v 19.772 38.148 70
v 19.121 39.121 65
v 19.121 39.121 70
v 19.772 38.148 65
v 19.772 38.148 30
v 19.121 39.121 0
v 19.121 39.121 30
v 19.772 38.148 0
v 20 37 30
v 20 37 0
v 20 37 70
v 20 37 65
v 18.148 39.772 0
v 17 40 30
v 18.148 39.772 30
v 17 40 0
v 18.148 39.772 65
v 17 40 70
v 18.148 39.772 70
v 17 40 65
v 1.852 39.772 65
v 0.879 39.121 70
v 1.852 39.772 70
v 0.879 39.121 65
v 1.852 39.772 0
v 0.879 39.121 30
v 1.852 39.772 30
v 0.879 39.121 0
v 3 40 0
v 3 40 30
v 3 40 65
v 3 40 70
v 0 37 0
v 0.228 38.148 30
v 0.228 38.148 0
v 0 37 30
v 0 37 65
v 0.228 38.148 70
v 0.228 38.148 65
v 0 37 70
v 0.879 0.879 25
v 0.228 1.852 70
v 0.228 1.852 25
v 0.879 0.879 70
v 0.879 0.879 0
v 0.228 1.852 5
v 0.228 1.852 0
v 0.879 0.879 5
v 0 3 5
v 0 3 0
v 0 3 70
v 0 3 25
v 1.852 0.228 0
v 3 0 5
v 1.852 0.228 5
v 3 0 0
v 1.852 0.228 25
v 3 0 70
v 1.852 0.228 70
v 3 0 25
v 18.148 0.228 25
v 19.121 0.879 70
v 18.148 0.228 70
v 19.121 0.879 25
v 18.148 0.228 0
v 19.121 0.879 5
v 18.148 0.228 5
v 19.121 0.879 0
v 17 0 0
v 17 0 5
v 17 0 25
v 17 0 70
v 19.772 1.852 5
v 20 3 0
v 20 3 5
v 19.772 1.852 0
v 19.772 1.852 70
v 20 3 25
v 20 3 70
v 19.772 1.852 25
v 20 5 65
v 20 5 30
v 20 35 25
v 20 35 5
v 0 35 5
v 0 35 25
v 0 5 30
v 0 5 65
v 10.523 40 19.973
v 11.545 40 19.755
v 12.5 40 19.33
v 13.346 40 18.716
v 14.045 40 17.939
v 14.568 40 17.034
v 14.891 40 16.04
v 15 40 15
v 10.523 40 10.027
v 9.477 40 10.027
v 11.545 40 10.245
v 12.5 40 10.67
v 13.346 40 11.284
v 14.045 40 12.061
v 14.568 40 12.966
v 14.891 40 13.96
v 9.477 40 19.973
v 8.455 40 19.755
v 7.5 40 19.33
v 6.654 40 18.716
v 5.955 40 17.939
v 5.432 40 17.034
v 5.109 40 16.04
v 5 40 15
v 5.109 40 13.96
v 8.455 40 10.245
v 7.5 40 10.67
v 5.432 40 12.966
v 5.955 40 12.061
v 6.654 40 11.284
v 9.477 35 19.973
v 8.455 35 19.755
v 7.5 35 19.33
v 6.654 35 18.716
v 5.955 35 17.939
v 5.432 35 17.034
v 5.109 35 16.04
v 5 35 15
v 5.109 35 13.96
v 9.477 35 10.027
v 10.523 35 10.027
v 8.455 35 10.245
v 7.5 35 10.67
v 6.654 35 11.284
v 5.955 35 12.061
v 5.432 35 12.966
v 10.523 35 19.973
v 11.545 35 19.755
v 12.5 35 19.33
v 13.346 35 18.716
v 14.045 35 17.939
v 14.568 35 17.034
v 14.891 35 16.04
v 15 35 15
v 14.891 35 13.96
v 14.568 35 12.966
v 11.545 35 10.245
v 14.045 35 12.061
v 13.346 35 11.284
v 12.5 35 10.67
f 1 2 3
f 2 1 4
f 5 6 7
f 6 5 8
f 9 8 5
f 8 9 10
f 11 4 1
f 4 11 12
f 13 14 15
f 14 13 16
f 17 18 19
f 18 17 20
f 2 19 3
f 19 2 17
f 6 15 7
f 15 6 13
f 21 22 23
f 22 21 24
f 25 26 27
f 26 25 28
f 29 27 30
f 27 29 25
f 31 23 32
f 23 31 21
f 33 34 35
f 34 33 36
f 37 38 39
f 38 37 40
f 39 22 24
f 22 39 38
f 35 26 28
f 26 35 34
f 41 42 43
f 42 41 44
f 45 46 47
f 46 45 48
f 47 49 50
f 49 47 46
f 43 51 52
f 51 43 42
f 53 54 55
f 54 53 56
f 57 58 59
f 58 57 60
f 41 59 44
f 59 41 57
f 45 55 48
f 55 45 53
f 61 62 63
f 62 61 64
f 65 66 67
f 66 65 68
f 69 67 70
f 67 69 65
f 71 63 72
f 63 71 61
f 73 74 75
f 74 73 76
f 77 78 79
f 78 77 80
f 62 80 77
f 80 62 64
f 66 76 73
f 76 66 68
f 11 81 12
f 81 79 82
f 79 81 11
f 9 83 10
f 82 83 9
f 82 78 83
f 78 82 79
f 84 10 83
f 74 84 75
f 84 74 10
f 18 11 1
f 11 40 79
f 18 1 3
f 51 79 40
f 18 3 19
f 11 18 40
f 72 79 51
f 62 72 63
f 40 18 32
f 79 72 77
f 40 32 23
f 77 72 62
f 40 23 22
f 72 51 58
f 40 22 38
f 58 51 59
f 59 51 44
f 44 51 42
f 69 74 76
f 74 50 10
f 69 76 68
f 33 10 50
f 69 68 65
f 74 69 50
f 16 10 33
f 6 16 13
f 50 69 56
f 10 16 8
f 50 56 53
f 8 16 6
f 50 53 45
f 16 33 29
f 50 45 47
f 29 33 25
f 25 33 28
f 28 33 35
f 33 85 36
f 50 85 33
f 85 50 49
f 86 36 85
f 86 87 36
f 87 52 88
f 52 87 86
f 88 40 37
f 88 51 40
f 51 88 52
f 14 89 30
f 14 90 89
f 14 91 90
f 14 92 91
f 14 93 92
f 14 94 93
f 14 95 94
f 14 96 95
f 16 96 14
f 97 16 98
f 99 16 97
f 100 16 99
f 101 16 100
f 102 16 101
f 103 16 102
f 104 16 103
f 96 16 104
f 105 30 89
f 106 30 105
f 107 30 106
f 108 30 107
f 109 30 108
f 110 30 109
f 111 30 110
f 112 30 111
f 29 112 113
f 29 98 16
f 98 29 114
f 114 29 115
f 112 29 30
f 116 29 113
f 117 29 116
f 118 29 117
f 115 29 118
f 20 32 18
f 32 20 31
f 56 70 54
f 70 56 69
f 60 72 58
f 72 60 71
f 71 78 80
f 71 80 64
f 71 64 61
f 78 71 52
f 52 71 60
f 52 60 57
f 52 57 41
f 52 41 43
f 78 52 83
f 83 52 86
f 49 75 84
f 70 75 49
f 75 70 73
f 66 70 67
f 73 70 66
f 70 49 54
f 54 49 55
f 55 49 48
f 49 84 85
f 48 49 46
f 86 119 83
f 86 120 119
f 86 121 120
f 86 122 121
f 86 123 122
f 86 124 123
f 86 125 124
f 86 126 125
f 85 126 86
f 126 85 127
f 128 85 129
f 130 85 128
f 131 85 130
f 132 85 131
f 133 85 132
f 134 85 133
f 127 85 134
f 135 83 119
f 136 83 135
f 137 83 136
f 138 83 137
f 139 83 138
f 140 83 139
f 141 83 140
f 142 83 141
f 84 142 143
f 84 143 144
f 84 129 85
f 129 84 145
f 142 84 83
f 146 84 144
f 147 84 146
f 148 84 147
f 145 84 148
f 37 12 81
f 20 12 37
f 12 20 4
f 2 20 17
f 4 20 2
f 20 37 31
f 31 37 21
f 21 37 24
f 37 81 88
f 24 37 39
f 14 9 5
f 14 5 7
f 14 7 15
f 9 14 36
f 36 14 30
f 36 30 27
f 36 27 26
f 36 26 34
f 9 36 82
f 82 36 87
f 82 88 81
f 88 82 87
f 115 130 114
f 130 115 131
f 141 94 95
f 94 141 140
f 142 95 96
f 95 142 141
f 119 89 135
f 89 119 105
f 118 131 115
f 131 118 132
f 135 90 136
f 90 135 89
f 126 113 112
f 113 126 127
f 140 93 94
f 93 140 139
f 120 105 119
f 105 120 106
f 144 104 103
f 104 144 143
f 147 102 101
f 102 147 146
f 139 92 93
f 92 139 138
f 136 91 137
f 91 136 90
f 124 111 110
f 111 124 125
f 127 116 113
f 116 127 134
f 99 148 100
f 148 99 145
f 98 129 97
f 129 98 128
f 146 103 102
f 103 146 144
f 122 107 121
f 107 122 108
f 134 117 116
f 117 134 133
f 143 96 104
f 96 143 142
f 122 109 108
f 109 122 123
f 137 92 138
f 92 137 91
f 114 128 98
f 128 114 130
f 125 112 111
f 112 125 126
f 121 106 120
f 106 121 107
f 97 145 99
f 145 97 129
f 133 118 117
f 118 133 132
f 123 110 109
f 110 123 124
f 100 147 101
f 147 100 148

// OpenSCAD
// [FL_INDEX: keywords="openscad, 3d_parametric, Parametric_Desk_Hook_w__Hole_for_Headphone_Cable, csg_solid" | COT="Parametric OpenSCAD design from 3DCodeverse"]
// Title: Parametric Desk Hook w/ Hole for Headphone Cable

// Parametric Desk Hook w/ Hole for Headphone Cable
// fros1y 

// Width of hook
width = 20;

// Height of Desk for Hook
desk_height = 35;

// Height for Hook Part
hook_height = 20;

// Thickness of Plastic in Hook
thickness = 5;

// Depth of Hook
depth=40;

// Diameter of Headphone Jack (0 disables)
jack = 10;

// Fillet code borrowed from Vaclav Hula (http://axuv.blogspot.com/2012/05/openscad-helper-funcions-for-better.html)

module fillet(radius, height=100, $fn=16) {                                     
    //this creates negative of fillet,
    //i.e. thing to be substracted from object
    translate([-radius, -radius, -height/2-0.01])
        difference() {
            cube([radius*2, radius*2, height+0.02]);
            cylinder(r=radius, h=height+0.02, $fn=16);
        }
}


module cube_negative_fillet(
        size,
        radius=-1,
        vertical=[3,3,3,3], 
        top=[0,0,0,0],
        bottom=[0,0,0,0],
        $fn=0
    ){

    j=[1,0,1,0];

    for (i=[0:3]) {
        if (radius > -1) {
            rotate([0, 0, 90*i])
                translate([size[1-j[i]]/2, size[j[i]]/2, 0])
                    fillet(radius, size[2], $fn=$fn);
        } else {
            rotate([0, 0, 90*i])
                translate([size[1-j[i]]/2, size[j[i]]/2, 0])
                    fillet(vertical[i], size[2], $fn=$fn);
        }
        rotate([90*i, -90, 0])
            translate([size[2]/2, size[j[i]]/2, 0 ])
                fillet(top[i], size[1-j[i]], $fn=$fn);
        rotate([90*(4-i), 90, 0])
            translate([size[2]/2, size[j[i]]/2, 0])
                fillet(bottom[i], size[1-j[i]], $fn=$fn);
    }
}

module cube_fillet_inside(
         size,
        radius=-1,
        vertical=[3,3,3,3],
        top=[0,0,0,0],
        bottom=[0,0,0,0],
        $fn=0
    ){
    if (radius == 0) {
        cube(size, center=true);
    } else {
        difference() {
            cube(size, center=true);
            cube_negative_fillet(size, radius, vertical, top, bottom, $fn);
        }
    }
}


module cube_fillet(
        size,
        radius=-1,
        vertical=[3,3,3,3],
        top=[0,0,0,0],
        bottom=[0,0,0,0],
        center=false,
        $fn=0 
    ){
    if (center) {
        cube_fillet_inside(size, radius, vertical, top, bottom, $fn);
    } else {
        translate([size[0]/2, size[1]/2, size[2]/2])
            cube_fillet_inside(size, radius, vertical, top, bottom, $fn);
    }
}

module desk_hook(width, desk_height, hook_height, thickness, depth, jack)
{
	difference() {
		cube_fillet([width, depth, thickness + desk_height + thickness + hook_height + thickness]);
		//cube([width, depth, thickness + desk_height + thickness + hook_height + thickness]);

		translate([0, 0, thickness]) {
			cube([width, depth - thickness, hook_height]);
		}

		translate([0, thickness, thickness + hook_height + thickness]) {
			cube([width,depth - thickness, desk_height]);
		}
	
		if(jack > 0)
		{
			translate([width/2, 0, thickness + hook_height /2])
				rotate(90, [1, 0, 0])
				cylinder(r=jack/2, center=true, h=depth*3, $fs=0.05);
		}	
	}
}

desk_hook(width, desk_height, hook_height, thickness, depth, jack);
